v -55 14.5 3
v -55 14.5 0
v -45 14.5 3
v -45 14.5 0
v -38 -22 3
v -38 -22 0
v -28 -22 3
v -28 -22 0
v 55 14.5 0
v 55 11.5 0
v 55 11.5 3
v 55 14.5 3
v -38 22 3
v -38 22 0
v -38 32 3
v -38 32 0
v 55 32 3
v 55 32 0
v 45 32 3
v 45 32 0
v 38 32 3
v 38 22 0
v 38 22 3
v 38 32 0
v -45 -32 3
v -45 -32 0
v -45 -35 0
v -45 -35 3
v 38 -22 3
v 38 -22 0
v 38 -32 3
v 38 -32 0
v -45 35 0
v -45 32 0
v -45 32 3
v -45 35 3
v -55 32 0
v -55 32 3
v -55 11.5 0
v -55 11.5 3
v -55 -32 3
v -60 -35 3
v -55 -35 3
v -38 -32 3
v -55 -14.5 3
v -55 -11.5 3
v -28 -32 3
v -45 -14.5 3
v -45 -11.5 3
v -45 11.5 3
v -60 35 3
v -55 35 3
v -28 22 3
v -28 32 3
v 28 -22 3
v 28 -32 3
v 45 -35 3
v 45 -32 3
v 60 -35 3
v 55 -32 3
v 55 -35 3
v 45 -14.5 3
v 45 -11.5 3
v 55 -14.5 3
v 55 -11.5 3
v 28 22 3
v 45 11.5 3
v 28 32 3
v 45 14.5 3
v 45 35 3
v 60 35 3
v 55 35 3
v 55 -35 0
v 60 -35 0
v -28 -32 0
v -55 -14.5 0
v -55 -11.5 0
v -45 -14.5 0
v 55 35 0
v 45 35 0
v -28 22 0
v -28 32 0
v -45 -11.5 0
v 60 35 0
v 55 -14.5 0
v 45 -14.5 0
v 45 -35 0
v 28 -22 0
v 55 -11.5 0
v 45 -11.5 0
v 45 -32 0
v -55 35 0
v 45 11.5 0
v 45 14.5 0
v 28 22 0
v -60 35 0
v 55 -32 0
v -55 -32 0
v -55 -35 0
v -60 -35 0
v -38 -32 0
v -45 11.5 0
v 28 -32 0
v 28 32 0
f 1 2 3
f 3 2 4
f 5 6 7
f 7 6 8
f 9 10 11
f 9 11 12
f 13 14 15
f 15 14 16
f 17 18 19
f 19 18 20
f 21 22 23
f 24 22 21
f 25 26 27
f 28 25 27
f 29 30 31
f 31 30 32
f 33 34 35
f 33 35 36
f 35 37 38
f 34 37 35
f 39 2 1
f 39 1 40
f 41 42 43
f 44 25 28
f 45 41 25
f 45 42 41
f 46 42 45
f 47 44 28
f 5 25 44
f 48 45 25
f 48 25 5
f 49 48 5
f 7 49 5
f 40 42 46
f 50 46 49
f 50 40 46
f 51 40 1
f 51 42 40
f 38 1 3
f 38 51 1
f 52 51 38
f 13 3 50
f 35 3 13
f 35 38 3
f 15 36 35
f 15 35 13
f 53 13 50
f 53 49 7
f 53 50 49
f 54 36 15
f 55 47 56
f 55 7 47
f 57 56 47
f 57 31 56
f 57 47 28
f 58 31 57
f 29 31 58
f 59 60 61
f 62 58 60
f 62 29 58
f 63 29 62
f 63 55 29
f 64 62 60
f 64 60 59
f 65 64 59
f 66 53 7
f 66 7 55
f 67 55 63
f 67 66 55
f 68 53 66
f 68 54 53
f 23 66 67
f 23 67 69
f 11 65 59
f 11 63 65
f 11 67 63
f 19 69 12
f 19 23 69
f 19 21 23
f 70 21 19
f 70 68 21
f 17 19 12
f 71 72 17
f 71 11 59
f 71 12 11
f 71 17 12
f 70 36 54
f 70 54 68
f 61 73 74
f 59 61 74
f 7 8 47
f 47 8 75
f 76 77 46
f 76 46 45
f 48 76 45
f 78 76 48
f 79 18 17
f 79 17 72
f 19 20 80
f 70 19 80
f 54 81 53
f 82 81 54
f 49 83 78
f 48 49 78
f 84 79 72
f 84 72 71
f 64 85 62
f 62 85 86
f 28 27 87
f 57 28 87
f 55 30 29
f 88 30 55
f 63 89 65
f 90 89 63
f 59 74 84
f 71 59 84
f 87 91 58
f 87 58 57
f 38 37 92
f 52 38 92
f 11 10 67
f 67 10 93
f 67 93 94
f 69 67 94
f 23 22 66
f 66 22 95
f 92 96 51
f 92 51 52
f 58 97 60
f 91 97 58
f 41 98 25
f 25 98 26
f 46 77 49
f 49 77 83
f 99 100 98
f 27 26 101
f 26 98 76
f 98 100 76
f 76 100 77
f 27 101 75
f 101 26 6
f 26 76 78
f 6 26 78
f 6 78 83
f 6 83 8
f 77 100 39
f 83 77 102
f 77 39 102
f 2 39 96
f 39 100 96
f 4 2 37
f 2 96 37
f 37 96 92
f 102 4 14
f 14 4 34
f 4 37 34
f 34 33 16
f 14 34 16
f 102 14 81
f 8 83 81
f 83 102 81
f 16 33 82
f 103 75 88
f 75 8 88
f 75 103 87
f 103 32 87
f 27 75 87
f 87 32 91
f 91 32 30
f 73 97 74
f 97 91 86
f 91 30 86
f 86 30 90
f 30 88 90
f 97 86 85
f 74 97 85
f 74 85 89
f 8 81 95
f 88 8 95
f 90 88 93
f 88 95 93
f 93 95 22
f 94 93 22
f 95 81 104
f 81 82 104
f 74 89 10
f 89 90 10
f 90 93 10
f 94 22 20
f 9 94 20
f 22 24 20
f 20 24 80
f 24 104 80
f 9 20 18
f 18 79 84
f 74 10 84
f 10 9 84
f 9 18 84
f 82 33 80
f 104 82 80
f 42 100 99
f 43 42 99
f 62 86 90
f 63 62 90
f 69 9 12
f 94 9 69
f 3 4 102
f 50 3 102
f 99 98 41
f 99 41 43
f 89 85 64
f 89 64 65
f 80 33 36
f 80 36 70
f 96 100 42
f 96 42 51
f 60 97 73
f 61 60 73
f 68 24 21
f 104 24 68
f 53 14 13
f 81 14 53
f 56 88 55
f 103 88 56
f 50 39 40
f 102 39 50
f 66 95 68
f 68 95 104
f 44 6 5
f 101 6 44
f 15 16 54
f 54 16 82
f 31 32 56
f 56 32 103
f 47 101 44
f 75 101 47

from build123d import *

# Parameters (mm, degrees)
SKETCH2_W               = 120
SKETCH2_H               = 70
BOSS_EXTRUDE1_DEPTH     = 3
SKETCH3_W               = 10
SKETCH3_H               = 3
CUT_EXTRUDE1_DEPTH      = 70.526973183
LPATTERN1_COUNT         = 2
LPATTERN1_PITCH         = 20.5
SKETCH4_W               = 10
SKETCH4_H               = 10
CUT_EXTRUDE2_DEPTH      = 70.526973183
MIRROR1_COPY_1_SKETCH_W = 10
MIRROR1_COPY_1_SKETCH_H = 3
MIRROR1_COPY_1_DEPTH    = 70.526973183
MIRROR2_COPY_1_SKETCH_W = 10
MIRROR2_COPY_1_SKETCH_H = 3
MIRROR2_COPY_1_DEPTH    = 70.526973183
MIRROR2_COPY_2_SKETCH_W = 10
MIRROR2_COPY_2_SKETCH_H = 3
MIRROR2_COPY_2_DEPTH    = 70.526973183
MIRROR2_COPY_3_SKETCH_W = 10
MIRROR2_COPY_3_SKETCH_H = 10
MIRROR2_COPY_3_DEPTH    = 70.526973183
MIRROR2_COPY_4_SKETCH_W = 10
MIRROR2_COPY_4_SKETCH_H = 3
MIRROR2_COPY_4_DEPTH    = 70.526973183


with BuildPart() as part:
    # Sketch2 → Boss-Extrude1 (new body)
    with BuildSketch(Plane.XY):
        Rectangle(SKETCH2_W, SKETCH2_H)
    extrude(amount=BOSS_EXTRUDE1_DEPTH)

    # Sketch3 → Cut-Extrude1 (cut, symmetric)
    with BuildSketch(Plane(origin=(0, 0, 0), x_dir=(-1, 0, 0), z_dir=(0, 0, -1))):
        with Locations((-50, 33.5)):
            Rectangle(SKETCH3_W, SKETCH3_H)
    cut_extrude1 = extrude(amount=CUT_EXTRUDE1_DEPTH, both=True, mode=Mode.SUBTRACT)

    # LPattern1: Cut-Extrude1 ×2
    with Locations(*[(0, -i * LPATTERN1_PITCH, 0) for i in range(1, LPATTERN1_COUNT)]):
        add(cut_extrude1, mode=Mode.SUBTRACT)

    # Sketch4 → Cut-Extrude2 (cut, through all)
    with BuildSketch(Plane(origin=(0, 0, 0), x_dir=(-1, 0, 0), z_dir=(0, 0, -1))):
        with Locations((-33, 27)):
            Rectangle(SKETCH4_W, SKETCH4_H)
    cut_extrude2 = extrude(amount=-CUT_EXTRUDE2_DEPTH, mode=Mode.SUBTRACT)

    # Mirror1: Cut-Extrude1, Cut-Extrude2 across plane
    add(cut_extrude1.mirror(Plane.ZX), mode=Mode.SUBTRACT)
    add(cut_extrude2.mirror(Plane.ZX), mode=Mode.SUBTRACT)

    # Mirror1 copy 1 sketch → Mirror1 copy 1 (cut, symmetric)
    with BuildSketch(Plane(origin=(0, 20.5, 0), x_dir=(-1, 0, 0), z_dir=(0, 0, -1))):
        with Locations((-50, -33.5)):
            Rectangle(MIRROR1_COPY_1_SKETCH_W, MIRROR1_COPY_1_SKETCH_H)
    extrude(amount=MIRROR1_COPY_1_DEPTH, both=True, mode=Mode.SUBTRACT)

    # Mirror2: Cut-Extrude1, Cut-Extrude2 across plane
    add(cut_extrude1.mirror(Plane(origin=(0, 0, 0), x_dir=(0, 0, 1), z_dir=(1, 0, 0))), mode=Mode.SUBTRACT)
    add(cut_extrude2.mirror(Plane(origin=(0, 0, 0), x_dir=(0, 0, 1), z_dir=(1, 0, 0))), mode=Mode.SUBTRACT)

    # Mirror2 copy 1 sketch → Mirror2 copy 1 (cut, symmetric)
    with BuildSketch(Plane(origin=(0, -20.5, 0), x_dir=(1, 0, 0), z_dir=(0, 0, -1))):
        with Locations((-50, -33.5)):
            Rectangle(MIRROR2_COPY_1_SKETCH_W, MIRROR2_COPY_1_SKETCH_H)
    extrude(amount=MIRROR2_COPY_1_DEPTH, both=True, mode=Mode.SUBTRACT)

    # Mirror2 copy 2 sketch → Mirror2 copy 2 (cut, symmetric)
    with BuildSketch(Plane(origin=(0, 0, 0), x_dir=(1, 0, 0), z_dir=(0, 0, -1))):
        with Locations((-50, 33.5)):
            Rectangle(MIRROR2_COPY_2_SKETCH_W, MIRROR2_COPY_2_SKETCH_H)
    extrude(amount=MIRROR2_COPY_2_DEPTH, both=True, mode=Mode.SUBTRACT)

    # Mirror2 copy 3 sketch → Mirror2 copy 3 (cut, through all)
    with BuildSketch(Plane(origin=(0, 0, 0), x_dir=(1, 0, 0), z_dir=(0, 0, -1))):
        with Locations((-33, 27)):
            Rectangle(MIRROR2_COPY_3_SKETCH_W, MIRROR2_COPY_3_SKETCH_H)
    extrude(amount=-MIRROR2_COPY_3_DEPTH, mode=Mode.SUBTRACT)

    # Mirror2 copy 4 sketch → Mirror2 copy 4 (cut, symmetric)
    with BuildSketch(Plane(origin=(0, 20.5, 0), x_dir=(1, 0, 0), z_dir=(0, 0, -1))):
        with Locations((-50, 33.5)):
            Rectangle(MIRROR2_COPY_4_SKETCH_W, MIRROR2_COPY_4_SKETCH_H)
    extrude(amount=MIRROR2_COPY_4_DEPTH, both=True, mode=Mode.SUBTRACT)


solid = part.part
